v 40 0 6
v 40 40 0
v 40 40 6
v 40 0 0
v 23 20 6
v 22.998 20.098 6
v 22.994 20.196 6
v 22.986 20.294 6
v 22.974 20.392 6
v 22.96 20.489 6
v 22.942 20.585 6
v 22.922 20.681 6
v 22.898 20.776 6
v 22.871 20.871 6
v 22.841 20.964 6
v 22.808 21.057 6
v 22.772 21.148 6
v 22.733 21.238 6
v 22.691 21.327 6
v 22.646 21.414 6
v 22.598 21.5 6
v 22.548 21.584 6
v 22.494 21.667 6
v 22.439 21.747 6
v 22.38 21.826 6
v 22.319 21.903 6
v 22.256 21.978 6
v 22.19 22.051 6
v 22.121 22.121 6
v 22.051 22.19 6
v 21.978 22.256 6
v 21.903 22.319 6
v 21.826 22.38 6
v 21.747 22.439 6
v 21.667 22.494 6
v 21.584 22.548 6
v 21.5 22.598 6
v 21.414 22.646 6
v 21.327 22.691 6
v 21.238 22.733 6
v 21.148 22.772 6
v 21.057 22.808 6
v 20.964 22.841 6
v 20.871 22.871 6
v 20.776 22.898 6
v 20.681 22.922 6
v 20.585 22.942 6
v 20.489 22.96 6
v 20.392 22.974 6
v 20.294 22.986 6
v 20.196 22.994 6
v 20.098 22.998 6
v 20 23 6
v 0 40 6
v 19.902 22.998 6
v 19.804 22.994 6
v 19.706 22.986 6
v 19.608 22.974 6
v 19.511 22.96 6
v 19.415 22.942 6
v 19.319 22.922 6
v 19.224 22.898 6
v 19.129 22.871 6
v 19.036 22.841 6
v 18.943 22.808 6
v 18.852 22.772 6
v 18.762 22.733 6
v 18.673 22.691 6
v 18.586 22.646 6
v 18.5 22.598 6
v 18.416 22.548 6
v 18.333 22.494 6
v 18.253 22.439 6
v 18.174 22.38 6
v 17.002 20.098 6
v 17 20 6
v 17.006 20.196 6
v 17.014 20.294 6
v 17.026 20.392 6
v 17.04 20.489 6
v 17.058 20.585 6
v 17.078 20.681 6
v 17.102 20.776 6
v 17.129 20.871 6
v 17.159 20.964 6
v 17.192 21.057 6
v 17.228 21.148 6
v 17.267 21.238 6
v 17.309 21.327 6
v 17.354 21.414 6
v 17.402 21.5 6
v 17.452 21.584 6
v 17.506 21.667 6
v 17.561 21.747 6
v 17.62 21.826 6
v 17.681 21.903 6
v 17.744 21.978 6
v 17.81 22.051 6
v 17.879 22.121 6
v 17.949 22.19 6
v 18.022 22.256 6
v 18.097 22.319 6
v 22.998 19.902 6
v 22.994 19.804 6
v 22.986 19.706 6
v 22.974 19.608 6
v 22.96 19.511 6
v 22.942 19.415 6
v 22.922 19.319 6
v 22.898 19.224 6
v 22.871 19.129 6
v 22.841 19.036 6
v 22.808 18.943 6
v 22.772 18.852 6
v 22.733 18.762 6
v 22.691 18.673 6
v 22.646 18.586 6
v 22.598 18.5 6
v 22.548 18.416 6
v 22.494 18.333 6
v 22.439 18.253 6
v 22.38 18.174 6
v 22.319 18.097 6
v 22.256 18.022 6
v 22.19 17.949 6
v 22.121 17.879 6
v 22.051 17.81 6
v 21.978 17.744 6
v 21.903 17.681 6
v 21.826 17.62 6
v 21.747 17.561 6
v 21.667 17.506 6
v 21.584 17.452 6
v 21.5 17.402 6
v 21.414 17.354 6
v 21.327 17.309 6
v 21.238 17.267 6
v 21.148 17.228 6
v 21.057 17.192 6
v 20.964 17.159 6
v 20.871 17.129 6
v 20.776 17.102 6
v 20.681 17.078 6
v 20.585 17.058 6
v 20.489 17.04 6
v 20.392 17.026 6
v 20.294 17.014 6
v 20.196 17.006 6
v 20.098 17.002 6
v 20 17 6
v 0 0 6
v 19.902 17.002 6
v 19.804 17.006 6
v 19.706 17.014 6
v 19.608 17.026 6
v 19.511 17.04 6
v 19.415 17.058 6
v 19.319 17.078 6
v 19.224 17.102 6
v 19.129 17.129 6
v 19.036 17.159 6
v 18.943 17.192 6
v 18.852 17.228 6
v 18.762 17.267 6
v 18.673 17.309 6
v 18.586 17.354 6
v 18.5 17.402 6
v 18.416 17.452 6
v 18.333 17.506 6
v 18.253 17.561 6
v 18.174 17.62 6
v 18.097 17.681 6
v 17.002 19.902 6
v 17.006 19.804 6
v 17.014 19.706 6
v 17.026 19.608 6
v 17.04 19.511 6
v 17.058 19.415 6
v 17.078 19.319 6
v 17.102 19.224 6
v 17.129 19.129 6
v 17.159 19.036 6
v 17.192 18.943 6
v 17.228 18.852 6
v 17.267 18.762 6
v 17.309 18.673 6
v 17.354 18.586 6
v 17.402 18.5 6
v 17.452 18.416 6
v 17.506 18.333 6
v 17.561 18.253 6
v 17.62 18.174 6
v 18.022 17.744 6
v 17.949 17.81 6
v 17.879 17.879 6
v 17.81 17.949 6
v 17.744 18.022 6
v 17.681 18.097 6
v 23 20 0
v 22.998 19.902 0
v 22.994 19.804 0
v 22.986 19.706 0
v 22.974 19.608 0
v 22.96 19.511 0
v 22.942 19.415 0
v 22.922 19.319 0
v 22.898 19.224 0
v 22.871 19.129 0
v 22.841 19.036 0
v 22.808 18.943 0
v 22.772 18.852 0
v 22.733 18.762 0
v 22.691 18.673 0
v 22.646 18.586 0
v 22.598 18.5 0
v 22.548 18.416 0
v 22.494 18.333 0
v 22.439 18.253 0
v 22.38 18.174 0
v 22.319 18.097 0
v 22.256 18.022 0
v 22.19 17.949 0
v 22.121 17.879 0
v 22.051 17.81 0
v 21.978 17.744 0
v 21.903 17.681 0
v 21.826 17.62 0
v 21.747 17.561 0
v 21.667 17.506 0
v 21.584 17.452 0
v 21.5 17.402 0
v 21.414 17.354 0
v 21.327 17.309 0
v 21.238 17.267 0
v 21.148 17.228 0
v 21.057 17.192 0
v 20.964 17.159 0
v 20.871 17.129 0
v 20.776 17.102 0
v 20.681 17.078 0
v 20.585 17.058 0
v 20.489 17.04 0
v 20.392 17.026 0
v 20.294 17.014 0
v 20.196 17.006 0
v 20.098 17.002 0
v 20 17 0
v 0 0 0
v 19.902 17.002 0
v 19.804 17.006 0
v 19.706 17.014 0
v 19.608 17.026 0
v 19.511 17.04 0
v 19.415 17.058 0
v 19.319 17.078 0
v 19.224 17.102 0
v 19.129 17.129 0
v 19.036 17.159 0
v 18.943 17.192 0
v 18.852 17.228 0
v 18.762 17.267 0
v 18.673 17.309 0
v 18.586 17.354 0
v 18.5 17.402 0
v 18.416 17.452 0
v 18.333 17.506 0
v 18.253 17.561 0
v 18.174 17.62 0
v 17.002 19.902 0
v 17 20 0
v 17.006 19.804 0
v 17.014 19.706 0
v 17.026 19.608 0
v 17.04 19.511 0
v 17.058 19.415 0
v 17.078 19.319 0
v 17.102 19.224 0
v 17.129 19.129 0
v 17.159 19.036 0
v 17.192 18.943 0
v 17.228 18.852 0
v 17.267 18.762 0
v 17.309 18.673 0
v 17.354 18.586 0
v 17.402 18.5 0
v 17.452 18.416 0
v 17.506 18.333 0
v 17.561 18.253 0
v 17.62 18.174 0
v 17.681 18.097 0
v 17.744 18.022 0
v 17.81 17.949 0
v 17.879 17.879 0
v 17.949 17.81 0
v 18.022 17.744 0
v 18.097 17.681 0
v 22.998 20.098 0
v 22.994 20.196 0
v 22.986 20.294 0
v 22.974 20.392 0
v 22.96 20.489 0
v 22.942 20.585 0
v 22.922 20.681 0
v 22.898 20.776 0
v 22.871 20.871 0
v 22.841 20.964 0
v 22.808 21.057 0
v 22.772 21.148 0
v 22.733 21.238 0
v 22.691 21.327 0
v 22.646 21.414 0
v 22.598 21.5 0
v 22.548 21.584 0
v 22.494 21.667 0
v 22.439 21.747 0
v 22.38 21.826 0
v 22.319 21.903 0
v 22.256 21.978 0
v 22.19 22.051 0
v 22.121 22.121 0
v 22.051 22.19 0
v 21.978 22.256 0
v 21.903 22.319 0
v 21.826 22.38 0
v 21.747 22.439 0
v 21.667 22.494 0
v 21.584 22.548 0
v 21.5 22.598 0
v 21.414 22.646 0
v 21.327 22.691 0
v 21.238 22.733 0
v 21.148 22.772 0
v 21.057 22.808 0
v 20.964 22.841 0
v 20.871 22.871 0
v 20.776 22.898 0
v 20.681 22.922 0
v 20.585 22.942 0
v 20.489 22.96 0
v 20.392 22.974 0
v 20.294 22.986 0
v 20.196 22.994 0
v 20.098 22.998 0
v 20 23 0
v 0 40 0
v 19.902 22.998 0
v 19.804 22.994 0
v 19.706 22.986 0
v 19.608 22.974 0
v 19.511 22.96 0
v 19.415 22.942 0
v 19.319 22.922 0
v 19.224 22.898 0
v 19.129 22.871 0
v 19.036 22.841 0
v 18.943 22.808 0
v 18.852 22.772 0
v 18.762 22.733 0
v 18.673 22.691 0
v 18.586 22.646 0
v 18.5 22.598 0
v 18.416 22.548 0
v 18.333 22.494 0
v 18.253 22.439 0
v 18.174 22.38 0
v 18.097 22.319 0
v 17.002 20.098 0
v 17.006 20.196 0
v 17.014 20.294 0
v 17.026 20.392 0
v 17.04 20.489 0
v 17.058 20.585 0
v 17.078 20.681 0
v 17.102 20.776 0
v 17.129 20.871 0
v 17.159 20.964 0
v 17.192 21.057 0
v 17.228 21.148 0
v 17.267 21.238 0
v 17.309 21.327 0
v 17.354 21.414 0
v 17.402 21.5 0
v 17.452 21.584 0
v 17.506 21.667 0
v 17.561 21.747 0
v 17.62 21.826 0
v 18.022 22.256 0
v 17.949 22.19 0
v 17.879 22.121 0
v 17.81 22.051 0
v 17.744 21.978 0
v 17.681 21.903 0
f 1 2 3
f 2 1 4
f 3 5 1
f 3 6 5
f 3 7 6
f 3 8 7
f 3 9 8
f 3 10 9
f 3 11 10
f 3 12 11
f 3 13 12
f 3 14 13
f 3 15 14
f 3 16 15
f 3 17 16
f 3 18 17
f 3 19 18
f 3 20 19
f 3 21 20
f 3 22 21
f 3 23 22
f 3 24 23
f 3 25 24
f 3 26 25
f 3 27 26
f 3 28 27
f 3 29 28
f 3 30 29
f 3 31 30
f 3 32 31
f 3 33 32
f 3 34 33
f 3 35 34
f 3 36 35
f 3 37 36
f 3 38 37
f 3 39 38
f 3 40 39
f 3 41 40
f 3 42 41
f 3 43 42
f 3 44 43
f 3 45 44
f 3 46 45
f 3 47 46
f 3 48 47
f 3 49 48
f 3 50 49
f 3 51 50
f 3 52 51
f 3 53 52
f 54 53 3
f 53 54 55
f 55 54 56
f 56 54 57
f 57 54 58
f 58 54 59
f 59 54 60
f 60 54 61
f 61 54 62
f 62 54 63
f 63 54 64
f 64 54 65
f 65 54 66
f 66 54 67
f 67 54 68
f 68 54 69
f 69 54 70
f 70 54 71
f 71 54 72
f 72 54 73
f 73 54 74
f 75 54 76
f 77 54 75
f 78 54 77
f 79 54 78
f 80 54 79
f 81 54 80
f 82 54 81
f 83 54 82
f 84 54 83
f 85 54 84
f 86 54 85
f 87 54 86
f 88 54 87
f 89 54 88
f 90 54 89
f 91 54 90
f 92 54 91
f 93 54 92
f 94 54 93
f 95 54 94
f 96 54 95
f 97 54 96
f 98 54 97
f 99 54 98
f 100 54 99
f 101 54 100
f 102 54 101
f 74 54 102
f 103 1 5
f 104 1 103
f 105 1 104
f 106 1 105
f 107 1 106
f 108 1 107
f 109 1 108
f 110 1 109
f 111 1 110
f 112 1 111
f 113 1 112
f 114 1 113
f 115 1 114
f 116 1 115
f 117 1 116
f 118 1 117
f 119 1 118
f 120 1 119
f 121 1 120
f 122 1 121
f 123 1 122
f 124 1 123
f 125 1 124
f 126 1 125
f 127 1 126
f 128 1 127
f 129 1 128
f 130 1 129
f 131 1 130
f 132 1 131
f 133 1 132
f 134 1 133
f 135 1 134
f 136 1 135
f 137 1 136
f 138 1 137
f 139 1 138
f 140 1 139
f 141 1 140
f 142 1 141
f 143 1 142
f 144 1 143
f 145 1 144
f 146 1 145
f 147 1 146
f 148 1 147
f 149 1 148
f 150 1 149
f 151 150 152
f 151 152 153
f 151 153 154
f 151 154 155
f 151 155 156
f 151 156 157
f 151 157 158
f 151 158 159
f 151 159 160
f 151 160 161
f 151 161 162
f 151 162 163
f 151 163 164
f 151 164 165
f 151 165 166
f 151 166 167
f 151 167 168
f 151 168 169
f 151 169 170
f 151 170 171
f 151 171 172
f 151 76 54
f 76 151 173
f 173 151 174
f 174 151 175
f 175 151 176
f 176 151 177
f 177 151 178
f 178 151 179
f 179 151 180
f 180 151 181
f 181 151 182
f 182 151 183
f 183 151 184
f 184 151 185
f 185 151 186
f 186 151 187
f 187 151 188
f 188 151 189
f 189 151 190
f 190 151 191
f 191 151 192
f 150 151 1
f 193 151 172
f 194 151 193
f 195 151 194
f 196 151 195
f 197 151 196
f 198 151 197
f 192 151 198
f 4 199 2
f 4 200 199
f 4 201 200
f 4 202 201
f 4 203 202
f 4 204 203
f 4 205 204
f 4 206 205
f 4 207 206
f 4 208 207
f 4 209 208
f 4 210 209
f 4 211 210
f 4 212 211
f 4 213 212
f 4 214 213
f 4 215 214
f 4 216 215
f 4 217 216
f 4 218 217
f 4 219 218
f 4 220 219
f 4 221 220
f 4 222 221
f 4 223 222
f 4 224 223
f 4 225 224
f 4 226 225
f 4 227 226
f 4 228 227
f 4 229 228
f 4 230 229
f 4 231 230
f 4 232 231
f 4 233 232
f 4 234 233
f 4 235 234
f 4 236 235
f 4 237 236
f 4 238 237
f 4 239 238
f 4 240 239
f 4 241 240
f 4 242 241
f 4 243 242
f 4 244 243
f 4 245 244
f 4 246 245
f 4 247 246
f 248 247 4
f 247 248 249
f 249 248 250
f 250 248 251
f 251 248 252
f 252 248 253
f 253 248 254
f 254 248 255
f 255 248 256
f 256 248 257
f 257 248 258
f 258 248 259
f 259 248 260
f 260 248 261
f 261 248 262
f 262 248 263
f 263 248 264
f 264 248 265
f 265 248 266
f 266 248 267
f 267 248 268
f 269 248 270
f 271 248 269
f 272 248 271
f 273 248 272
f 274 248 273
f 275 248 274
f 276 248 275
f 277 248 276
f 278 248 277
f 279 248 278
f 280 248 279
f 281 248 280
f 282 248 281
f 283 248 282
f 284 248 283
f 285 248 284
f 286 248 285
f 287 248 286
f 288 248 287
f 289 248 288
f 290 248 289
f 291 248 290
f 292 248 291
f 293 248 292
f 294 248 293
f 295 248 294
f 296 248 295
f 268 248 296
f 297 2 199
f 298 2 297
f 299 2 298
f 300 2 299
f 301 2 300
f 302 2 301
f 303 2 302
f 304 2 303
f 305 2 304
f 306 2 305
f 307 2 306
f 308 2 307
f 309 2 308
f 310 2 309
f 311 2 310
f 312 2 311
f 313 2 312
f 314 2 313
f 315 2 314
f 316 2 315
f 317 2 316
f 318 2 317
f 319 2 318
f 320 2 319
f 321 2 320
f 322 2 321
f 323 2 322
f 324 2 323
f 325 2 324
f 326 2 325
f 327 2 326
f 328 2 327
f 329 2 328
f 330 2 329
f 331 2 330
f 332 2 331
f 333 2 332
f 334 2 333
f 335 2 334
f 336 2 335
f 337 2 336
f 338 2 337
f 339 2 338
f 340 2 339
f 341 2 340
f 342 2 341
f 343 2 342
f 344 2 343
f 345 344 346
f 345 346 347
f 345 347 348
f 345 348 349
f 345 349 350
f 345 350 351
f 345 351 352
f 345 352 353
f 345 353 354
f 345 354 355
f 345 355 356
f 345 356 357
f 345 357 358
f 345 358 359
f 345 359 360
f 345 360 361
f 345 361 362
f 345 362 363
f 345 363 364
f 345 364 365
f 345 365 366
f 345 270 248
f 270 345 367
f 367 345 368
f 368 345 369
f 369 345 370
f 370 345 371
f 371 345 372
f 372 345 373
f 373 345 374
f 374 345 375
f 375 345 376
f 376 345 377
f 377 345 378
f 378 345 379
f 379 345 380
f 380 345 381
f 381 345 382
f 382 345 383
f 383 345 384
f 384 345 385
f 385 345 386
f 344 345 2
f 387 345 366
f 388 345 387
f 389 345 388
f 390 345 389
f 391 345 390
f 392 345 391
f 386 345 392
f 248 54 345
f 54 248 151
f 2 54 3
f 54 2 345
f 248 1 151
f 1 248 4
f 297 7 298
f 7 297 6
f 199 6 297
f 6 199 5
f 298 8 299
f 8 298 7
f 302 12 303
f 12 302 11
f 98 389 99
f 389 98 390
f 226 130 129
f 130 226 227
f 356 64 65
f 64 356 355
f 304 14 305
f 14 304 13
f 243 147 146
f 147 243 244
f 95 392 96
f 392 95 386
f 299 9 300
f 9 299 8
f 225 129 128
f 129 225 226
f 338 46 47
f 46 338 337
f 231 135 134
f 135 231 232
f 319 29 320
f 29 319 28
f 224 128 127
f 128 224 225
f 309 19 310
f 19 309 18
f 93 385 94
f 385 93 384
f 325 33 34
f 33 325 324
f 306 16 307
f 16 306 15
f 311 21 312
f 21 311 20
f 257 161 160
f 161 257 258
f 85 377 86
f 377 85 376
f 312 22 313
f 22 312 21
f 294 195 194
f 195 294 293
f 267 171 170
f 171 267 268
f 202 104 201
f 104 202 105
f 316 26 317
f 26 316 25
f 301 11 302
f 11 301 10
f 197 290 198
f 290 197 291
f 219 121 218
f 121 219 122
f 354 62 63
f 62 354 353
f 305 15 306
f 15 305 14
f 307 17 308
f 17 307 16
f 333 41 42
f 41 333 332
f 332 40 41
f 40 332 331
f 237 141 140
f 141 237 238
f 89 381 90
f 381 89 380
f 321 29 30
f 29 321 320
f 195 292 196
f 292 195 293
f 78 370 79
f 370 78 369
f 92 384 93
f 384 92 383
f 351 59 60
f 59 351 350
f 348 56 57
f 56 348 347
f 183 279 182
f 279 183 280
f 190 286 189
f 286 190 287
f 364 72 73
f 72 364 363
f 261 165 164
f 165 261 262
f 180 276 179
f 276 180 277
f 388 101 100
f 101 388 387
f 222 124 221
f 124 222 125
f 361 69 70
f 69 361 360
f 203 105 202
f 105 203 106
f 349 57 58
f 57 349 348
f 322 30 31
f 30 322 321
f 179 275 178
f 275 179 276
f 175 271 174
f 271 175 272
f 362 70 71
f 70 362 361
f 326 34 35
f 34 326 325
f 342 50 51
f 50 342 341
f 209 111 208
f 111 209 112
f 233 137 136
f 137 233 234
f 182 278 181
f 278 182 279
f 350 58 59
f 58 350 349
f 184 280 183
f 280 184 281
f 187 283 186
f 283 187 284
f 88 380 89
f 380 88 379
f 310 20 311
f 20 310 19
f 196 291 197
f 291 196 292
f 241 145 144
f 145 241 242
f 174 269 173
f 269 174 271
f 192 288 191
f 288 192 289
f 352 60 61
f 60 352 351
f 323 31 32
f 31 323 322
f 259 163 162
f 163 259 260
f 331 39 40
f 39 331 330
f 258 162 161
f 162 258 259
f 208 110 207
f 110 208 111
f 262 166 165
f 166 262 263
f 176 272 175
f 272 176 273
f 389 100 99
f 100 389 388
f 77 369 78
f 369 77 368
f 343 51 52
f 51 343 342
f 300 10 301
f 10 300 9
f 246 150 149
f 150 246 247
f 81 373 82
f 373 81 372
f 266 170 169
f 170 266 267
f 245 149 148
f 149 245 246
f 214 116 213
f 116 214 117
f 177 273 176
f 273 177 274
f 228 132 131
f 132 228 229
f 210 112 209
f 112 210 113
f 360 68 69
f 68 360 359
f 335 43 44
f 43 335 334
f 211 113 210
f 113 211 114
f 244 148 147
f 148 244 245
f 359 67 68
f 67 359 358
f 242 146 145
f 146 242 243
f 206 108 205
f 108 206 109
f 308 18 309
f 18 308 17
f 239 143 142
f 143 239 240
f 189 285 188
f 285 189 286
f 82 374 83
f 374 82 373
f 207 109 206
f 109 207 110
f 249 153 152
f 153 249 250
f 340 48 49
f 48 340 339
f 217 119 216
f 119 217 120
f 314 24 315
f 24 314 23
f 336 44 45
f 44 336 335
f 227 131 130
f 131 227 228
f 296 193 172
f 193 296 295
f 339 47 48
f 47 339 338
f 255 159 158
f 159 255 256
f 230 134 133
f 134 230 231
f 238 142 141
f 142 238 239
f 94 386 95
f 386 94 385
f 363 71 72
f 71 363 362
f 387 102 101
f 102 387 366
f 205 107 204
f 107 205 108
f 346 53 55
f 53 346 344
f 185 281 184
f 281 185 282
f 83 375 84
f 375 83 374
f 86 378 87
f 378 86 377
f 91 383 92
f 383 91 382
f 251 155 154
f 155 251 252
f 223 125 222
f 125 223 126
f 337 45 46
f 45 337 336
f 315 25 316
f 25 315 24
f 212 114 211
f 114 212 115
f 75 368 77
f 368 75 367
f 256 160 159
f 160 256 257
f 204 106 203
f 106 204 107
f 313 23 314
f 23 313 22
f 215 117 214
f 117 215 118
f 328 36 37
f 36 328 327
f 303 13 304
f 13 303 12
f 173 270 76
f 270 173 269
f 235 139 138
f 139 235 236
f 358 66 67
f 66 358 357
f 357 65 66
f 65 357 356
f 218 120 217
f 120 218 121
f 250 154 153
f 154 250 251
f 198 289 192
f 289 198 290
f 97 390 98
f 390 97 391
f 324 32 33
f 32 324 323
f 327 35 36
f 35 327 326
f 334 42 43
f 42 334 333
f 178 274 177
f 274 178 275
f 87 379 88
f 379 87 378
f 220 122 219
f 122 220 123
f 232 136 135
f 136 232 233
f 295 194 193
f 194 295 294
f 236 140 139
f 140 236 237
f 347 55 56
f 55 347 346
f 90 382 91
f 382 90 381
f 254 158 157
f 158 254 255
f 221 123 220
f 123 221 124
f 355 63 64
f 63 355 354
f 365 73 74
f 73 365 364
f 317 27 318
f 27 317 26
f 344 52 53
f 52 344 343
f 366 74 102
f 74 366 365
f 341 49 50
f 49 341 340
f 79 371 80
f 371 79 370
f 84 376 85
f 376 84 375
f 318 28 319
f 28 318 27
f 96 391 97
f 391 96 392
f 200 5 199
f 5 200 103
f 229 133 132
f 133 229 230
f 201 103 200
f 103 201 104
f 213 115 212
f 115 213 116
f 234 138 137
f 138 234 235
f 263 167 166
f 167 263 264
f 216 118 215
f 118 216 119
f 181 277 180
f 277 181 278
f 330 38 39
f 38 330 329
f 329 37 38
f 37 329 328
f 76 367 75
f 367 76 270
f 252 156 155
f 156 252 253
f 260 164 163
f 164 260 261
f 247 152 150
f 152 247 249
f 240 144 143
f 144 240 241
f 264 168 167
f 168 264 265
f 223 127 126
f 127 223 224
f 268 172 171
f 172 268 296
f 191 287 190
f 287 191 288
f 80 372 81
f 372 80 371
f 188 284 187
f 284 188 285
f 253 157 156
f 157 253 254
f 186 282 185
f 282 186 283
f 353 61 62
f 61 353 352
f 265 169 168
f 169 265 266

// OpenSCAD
// Piastrina 40 x 40 x 6 mm con foro passante centrale da 6 mm
lato = 40;
altezza = 6;
diametro_foro = 6;   // metti 6.2 se il foro deve accogliere un perno da 6 mm

difference() {
    cube([lato, lato, altezza]);
    translate([lato/2, lato/2, -1])
        cylinder(d = diametro_foro, h = altezza + 2, $fn = 192);
}
